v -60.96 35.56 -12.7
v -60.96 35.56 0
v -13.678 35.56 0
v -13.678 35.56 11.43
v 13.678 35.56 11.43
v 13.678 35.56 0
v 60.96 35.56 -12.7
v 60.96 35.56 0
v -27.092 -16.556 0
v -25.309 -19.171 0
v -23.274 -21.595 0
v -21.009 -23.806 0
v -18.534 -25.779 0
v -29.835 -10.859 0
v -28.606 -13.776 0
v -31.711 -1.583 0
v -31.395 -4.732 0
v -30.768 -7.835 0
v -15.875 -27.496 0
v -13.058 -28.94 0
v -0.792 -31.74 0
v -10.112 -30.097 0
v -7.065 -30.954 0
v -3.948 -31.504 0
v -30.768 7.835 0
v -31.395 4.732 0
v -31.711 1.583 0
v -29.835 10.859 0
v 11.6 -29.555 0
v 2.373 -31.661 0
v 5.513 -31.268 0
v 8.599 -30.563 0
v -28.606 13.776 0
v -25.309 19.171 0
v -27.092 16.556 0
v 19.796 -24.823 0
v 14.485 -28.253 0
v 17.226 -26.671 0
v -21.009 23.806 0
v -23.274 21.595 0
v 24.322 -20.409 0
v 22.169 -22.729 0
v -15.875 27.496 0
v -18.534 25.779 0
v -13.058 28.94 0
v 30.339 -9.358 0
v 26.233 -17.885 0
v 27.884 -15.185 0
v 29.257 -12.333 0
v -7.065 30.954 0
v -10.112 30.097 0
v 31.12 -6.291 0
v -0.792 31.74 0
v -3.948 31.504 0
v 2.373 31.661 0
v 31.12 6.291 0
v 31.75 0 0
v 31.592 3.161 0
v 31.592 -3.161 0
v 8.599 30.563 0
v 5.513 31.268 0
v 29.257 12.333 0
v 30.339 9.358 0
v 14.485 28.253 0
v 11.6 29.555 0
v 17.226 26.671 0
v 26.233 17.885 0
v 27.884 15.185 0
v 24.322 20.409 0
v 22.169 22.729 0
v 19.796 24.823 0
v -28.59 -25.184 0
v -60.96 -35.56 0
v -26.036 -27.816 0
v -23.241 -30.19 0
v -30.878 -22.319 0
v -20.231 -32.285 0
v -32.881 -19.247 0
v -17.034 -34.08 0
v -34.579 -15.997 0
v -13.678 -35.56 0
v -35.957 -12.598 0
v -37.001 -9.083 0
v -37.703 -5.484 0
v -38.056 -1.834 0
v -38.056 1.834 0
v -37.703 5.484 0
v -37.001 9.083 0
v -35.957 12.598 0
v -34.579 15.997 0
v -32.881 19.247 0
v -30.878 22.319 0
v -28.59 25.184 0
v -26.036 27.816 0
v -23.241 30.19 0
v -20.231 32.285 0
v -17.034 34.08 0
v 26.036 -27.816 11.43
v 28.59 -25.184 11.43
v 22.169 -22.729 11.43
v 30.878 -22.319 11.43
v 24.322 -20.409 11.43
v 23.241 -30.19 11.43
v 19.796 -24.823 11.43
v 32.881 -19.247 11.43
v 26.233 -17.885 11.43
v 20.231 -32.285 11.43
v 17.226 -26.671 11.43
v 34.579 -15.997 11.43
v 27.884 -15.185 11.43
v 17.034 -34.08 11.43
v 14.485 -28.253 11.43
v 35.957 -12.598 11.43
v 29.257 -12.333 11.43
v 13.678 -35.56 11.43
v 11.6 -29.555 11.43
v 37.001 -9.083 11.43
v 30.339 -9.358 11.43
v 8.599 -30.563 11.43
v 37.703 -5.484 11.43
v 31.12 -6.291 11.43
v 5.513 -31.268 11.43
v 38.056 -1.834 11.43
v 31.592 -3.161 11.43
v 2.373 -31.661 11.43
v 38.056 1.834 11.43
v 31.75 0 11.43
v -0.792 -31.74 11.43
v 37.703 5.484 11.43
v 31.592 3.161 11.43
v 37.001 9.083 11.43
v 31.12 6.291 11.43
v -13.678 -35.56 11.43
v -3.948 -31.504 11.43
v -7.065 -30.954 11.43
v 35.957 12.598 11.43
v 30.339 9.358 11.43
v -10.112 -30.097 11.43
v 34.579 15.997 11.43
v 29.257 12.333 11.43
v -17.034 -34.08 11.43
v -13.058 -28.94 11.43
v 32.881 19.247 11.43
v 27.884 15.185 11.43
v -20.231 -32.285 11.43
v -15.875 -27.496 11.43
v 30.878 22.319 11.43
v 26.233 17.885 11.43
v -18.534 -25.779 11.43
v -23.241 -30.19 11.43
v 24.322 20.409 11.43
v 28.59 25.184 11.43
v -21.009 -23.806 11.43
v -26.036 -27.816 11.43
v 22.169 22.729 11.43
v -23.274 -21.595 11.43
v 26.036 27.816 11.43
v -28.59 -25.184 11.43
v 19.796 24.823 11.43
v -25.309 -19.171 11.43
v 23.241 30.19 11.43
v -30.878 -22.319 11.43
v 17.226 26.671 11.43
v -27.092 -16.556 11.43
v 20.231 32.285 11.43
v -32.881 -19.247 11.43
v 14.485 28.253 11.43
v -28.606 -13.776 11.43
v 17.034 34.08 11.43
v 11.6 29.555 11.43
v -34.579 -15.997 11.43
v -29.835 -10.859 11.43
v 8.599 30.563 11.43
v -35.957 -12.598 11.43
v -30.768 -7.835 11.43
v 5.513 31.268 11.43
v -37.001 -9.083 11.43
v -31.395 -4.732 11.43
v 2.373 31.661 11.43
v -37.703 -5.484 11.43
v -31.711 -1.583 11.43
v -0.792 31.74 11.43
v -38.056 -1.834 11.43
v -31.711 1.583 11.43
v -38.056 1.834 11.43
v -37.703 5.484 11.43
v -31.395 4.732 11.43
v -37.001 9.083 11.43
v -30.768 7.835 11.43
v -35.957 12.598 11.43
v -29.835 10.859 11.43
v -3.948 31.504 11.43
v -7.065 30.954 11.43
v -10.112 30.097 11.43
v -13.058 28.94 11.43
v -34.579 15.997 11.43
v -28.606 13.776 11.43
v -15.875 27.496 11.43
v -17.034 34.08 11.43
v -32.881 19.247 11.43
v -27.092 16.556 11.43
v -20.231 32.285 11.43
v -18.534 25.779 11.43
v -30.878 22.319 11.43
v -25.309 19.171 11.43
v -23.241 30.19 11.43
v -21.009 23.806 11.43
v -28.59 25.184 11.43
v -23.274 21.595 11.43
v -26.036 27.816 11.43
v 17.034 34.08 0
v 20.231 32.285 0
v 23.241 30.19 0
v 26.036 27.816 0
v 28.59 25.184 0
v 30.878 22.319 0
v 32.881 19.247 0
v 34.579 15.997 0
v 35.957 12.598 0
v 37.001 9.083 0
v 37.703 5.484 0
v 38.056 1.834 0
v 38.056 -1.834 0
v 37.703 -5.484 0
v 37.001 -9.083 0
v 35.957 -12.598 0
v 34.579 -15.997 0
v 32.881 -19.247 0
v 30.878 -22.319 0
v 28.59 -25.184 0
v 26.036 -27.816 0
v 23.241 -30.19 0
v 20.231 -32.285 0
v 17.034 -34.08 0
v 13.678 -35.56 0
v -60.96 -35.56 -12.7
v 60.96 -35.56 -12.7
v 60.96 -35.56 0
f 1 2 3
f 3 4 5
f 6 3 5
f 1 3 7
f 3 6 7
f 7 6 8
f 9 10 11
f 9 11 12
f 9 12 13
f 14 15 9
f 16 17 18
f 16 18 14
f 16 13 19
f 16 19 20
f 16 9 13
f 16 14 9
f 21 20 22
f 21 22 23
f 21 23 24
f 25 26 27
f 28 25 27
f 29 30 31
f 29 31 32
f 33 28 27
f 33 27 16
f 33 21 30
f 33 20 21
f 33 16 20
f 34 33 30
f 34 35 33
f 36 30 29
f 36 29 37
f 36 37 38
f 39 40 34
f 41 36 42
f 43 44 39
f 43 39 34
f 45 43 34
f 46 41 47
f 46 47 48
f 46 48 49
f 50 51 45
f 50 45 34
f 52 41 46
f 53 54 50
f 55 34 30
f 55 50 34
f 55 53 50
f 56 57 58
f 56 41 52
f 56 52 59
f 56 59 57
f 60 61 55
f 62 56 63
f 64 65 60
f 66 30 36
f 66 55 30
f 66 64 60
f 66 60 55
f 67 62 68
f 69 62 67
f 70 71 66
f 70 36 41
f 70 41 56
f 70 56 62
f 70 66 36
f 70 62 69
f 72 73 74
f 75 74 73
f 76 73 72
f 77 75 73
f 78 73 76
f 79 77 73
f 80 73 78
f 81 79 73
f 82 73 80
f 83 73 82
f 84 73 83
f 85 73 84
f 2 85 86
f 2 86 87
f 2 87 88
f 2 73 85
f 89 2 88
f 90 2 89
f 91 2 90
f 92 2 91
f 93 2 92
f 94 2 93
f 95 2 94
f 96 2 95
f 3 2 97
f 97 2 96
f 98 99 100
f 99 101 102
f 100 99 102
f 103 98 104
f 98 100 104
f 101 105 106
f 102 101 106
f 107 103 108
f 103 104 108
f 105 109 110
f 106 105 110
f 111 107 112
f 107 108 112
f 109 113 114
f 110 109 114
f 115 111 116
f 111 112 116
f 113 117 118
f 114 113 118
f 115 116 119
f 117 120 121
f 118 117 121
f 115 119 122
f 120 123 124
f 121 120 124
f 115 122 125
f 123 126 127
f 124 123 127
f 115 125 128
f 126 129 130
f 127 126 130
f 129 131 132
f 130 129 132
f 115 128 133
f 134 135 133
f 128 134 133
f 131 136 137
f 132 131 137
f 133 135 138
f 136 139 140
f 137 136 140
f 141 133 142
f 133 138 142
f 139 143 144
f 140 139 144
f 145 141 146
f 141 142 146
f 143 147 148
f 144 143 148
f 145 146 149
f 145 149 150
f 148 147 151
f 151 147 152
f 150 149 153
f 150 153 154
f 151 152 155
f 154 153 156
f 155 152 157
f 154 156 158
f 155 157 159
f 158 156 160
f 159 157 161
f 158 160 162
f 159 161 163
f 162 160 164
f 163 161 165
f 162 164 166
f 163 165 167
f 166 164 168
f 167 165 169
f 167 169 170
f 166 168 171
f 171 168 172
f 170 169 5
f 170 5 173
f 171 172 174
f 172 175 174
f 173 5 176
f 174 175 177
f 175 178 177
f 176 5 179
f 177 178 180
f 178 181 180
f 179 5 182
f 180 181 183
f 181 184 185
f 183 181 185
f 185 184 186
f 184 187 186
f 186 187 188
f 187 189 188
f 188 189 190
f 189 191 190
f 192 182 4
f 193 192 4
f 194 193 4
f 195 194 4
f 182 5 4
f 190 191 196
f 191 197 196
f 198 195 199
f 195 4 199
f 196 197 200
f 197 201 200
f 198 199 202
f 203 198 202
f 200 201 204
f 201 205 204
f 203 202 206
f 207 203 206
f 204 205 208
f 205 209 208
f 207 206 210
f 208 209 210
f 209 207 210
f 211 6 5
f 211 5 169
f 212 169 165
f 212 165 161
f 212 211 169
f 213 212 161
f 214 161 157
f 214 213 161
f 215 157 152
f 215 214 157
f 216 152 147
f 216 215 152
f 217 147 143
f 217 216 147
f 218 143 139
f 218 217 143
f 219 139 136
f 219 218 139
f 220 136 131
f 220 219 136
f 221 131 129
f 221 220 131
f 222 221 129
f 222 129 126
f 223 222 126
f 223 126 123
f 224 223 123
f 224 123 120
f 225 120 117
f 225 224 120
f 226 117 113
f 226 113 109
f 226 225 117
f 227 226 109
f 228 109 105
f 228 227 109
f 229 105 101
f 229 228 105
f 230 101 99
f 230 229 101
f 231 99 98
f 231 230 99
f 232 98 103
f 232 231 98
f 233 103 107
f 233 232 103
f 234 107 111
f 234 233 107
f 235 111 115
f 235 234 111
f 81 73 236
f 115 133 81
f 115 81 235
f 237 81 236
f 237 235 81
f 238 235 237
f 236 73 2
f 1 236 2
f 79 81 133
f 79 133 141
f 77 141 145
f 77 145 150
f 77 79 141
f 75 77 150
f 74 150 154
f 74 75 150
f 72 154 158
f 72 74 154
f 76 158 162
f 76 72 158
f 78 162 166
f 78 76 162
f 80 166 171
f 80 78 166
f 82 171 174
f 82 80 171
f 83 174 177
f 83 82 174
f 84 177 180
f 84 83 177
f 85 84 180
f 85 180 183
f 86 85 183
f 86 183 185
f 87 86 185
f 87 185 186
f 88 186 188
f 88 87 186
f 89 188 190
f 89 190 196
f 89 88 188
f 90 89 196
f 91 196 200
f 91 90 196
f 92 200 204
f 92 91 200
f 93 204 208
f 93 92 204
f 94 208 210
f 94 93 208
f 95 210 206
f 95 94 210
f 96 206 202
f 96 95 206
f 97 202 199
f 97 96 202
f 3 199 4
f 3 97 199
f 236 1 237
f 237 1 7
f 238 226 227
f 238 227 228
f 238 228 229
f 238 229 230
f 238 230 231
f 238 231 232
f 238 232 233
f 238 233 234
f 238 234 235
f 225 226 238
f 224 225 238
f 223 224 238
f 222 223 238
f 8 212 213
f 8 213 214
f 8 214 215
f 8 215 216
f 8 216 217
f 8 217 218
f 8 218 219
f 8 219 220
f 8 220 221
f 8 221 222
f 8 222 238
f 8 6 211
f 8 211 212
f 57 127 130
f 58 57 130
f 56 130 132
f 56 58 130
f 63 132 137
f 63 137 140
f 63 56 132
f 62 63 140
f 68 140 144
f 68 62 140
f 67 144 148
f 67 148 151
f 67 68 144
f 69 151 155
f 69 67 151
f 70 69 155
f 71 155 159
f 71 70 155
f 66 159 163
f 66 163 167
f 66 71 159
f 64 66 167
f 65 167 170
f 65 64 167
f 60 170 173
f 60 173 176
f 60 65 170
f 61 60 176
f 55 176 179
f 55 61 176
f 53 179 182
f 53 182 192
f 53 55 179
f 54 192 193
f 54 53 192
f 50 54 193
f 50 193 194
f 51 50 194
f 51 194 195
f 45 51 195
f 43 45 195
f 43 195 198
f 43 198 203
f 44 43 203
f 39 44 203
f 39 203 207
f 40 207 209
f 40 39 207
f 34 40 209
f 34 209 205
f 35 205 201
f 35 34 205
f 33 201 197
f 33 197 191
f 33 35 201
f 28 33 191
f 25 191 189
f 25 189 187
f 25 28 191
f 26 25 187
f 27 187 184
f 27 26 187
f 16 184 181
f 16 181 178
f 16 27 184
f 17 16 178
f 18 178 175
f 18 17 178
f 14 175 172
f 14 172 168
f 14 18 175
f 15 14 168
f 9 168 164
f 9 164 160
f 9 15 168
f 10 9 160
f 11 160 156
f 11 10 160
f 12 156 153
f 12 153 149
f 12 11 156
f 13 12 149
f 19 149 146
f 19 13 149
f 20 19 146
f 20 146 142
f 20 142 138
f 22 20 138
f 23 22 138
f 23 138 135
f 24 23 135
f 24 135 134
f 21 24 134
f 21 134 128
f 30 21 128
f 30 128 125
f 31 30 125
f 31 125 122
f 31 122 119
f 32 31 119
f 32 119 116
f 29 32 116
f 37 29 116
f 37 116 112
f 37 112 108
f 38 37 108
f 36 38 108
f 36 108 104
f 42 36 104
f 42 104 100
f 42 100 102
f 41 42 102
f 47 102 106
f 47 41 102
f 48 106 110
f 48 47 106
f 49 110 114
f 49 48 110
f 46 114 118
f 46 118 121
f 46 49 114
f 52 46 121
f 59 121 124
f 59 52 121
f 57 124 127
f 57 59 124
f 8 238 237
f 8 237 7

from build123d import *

# Parameters (mm, degrees)
SKETCH2_W           = 121.92
SKETCH2_H           = 71.12
BOSS_EXTRUDE1_DEPTH = 12.7
SKETCH3_R           = 31.75
BOSS_EXTRUDE2_DEPTH = 11.43


with BuildPart() as part:
    # Sketch2 → Boss-Extrude1 (new body)
    with BuildSketch(Plane.XY):
        Rectangle(SKETCH2_W, SKETCH2_H)
    extrude(amount=-BOSS_EXTRUDE1_DEPTH)

    # Sketch3 → Boss-Extrude2 (add)
    with BuildSketch(Plane.XY):
        with BuildLine():
            Line((-13.67831861, 35.56), (13.67831861, 35.56))
            ThreePointArc((13.67831861, 35.56), (38.1, 0), (13.67831861, -35.56))
            Line((13.67831861, -35.56), (-13.67831861, -35.56))
            ThreePointArc((-13.67831861, -35.56), (-38.1, 0), (-13.67831861, 35.56))
        make_face()
        Circle(SKETCH3_R, mode=Mode.SUBTRACT)
    extrude(amount=BOSS_EXTRUDE2_DEPTH)


solid = part.part
